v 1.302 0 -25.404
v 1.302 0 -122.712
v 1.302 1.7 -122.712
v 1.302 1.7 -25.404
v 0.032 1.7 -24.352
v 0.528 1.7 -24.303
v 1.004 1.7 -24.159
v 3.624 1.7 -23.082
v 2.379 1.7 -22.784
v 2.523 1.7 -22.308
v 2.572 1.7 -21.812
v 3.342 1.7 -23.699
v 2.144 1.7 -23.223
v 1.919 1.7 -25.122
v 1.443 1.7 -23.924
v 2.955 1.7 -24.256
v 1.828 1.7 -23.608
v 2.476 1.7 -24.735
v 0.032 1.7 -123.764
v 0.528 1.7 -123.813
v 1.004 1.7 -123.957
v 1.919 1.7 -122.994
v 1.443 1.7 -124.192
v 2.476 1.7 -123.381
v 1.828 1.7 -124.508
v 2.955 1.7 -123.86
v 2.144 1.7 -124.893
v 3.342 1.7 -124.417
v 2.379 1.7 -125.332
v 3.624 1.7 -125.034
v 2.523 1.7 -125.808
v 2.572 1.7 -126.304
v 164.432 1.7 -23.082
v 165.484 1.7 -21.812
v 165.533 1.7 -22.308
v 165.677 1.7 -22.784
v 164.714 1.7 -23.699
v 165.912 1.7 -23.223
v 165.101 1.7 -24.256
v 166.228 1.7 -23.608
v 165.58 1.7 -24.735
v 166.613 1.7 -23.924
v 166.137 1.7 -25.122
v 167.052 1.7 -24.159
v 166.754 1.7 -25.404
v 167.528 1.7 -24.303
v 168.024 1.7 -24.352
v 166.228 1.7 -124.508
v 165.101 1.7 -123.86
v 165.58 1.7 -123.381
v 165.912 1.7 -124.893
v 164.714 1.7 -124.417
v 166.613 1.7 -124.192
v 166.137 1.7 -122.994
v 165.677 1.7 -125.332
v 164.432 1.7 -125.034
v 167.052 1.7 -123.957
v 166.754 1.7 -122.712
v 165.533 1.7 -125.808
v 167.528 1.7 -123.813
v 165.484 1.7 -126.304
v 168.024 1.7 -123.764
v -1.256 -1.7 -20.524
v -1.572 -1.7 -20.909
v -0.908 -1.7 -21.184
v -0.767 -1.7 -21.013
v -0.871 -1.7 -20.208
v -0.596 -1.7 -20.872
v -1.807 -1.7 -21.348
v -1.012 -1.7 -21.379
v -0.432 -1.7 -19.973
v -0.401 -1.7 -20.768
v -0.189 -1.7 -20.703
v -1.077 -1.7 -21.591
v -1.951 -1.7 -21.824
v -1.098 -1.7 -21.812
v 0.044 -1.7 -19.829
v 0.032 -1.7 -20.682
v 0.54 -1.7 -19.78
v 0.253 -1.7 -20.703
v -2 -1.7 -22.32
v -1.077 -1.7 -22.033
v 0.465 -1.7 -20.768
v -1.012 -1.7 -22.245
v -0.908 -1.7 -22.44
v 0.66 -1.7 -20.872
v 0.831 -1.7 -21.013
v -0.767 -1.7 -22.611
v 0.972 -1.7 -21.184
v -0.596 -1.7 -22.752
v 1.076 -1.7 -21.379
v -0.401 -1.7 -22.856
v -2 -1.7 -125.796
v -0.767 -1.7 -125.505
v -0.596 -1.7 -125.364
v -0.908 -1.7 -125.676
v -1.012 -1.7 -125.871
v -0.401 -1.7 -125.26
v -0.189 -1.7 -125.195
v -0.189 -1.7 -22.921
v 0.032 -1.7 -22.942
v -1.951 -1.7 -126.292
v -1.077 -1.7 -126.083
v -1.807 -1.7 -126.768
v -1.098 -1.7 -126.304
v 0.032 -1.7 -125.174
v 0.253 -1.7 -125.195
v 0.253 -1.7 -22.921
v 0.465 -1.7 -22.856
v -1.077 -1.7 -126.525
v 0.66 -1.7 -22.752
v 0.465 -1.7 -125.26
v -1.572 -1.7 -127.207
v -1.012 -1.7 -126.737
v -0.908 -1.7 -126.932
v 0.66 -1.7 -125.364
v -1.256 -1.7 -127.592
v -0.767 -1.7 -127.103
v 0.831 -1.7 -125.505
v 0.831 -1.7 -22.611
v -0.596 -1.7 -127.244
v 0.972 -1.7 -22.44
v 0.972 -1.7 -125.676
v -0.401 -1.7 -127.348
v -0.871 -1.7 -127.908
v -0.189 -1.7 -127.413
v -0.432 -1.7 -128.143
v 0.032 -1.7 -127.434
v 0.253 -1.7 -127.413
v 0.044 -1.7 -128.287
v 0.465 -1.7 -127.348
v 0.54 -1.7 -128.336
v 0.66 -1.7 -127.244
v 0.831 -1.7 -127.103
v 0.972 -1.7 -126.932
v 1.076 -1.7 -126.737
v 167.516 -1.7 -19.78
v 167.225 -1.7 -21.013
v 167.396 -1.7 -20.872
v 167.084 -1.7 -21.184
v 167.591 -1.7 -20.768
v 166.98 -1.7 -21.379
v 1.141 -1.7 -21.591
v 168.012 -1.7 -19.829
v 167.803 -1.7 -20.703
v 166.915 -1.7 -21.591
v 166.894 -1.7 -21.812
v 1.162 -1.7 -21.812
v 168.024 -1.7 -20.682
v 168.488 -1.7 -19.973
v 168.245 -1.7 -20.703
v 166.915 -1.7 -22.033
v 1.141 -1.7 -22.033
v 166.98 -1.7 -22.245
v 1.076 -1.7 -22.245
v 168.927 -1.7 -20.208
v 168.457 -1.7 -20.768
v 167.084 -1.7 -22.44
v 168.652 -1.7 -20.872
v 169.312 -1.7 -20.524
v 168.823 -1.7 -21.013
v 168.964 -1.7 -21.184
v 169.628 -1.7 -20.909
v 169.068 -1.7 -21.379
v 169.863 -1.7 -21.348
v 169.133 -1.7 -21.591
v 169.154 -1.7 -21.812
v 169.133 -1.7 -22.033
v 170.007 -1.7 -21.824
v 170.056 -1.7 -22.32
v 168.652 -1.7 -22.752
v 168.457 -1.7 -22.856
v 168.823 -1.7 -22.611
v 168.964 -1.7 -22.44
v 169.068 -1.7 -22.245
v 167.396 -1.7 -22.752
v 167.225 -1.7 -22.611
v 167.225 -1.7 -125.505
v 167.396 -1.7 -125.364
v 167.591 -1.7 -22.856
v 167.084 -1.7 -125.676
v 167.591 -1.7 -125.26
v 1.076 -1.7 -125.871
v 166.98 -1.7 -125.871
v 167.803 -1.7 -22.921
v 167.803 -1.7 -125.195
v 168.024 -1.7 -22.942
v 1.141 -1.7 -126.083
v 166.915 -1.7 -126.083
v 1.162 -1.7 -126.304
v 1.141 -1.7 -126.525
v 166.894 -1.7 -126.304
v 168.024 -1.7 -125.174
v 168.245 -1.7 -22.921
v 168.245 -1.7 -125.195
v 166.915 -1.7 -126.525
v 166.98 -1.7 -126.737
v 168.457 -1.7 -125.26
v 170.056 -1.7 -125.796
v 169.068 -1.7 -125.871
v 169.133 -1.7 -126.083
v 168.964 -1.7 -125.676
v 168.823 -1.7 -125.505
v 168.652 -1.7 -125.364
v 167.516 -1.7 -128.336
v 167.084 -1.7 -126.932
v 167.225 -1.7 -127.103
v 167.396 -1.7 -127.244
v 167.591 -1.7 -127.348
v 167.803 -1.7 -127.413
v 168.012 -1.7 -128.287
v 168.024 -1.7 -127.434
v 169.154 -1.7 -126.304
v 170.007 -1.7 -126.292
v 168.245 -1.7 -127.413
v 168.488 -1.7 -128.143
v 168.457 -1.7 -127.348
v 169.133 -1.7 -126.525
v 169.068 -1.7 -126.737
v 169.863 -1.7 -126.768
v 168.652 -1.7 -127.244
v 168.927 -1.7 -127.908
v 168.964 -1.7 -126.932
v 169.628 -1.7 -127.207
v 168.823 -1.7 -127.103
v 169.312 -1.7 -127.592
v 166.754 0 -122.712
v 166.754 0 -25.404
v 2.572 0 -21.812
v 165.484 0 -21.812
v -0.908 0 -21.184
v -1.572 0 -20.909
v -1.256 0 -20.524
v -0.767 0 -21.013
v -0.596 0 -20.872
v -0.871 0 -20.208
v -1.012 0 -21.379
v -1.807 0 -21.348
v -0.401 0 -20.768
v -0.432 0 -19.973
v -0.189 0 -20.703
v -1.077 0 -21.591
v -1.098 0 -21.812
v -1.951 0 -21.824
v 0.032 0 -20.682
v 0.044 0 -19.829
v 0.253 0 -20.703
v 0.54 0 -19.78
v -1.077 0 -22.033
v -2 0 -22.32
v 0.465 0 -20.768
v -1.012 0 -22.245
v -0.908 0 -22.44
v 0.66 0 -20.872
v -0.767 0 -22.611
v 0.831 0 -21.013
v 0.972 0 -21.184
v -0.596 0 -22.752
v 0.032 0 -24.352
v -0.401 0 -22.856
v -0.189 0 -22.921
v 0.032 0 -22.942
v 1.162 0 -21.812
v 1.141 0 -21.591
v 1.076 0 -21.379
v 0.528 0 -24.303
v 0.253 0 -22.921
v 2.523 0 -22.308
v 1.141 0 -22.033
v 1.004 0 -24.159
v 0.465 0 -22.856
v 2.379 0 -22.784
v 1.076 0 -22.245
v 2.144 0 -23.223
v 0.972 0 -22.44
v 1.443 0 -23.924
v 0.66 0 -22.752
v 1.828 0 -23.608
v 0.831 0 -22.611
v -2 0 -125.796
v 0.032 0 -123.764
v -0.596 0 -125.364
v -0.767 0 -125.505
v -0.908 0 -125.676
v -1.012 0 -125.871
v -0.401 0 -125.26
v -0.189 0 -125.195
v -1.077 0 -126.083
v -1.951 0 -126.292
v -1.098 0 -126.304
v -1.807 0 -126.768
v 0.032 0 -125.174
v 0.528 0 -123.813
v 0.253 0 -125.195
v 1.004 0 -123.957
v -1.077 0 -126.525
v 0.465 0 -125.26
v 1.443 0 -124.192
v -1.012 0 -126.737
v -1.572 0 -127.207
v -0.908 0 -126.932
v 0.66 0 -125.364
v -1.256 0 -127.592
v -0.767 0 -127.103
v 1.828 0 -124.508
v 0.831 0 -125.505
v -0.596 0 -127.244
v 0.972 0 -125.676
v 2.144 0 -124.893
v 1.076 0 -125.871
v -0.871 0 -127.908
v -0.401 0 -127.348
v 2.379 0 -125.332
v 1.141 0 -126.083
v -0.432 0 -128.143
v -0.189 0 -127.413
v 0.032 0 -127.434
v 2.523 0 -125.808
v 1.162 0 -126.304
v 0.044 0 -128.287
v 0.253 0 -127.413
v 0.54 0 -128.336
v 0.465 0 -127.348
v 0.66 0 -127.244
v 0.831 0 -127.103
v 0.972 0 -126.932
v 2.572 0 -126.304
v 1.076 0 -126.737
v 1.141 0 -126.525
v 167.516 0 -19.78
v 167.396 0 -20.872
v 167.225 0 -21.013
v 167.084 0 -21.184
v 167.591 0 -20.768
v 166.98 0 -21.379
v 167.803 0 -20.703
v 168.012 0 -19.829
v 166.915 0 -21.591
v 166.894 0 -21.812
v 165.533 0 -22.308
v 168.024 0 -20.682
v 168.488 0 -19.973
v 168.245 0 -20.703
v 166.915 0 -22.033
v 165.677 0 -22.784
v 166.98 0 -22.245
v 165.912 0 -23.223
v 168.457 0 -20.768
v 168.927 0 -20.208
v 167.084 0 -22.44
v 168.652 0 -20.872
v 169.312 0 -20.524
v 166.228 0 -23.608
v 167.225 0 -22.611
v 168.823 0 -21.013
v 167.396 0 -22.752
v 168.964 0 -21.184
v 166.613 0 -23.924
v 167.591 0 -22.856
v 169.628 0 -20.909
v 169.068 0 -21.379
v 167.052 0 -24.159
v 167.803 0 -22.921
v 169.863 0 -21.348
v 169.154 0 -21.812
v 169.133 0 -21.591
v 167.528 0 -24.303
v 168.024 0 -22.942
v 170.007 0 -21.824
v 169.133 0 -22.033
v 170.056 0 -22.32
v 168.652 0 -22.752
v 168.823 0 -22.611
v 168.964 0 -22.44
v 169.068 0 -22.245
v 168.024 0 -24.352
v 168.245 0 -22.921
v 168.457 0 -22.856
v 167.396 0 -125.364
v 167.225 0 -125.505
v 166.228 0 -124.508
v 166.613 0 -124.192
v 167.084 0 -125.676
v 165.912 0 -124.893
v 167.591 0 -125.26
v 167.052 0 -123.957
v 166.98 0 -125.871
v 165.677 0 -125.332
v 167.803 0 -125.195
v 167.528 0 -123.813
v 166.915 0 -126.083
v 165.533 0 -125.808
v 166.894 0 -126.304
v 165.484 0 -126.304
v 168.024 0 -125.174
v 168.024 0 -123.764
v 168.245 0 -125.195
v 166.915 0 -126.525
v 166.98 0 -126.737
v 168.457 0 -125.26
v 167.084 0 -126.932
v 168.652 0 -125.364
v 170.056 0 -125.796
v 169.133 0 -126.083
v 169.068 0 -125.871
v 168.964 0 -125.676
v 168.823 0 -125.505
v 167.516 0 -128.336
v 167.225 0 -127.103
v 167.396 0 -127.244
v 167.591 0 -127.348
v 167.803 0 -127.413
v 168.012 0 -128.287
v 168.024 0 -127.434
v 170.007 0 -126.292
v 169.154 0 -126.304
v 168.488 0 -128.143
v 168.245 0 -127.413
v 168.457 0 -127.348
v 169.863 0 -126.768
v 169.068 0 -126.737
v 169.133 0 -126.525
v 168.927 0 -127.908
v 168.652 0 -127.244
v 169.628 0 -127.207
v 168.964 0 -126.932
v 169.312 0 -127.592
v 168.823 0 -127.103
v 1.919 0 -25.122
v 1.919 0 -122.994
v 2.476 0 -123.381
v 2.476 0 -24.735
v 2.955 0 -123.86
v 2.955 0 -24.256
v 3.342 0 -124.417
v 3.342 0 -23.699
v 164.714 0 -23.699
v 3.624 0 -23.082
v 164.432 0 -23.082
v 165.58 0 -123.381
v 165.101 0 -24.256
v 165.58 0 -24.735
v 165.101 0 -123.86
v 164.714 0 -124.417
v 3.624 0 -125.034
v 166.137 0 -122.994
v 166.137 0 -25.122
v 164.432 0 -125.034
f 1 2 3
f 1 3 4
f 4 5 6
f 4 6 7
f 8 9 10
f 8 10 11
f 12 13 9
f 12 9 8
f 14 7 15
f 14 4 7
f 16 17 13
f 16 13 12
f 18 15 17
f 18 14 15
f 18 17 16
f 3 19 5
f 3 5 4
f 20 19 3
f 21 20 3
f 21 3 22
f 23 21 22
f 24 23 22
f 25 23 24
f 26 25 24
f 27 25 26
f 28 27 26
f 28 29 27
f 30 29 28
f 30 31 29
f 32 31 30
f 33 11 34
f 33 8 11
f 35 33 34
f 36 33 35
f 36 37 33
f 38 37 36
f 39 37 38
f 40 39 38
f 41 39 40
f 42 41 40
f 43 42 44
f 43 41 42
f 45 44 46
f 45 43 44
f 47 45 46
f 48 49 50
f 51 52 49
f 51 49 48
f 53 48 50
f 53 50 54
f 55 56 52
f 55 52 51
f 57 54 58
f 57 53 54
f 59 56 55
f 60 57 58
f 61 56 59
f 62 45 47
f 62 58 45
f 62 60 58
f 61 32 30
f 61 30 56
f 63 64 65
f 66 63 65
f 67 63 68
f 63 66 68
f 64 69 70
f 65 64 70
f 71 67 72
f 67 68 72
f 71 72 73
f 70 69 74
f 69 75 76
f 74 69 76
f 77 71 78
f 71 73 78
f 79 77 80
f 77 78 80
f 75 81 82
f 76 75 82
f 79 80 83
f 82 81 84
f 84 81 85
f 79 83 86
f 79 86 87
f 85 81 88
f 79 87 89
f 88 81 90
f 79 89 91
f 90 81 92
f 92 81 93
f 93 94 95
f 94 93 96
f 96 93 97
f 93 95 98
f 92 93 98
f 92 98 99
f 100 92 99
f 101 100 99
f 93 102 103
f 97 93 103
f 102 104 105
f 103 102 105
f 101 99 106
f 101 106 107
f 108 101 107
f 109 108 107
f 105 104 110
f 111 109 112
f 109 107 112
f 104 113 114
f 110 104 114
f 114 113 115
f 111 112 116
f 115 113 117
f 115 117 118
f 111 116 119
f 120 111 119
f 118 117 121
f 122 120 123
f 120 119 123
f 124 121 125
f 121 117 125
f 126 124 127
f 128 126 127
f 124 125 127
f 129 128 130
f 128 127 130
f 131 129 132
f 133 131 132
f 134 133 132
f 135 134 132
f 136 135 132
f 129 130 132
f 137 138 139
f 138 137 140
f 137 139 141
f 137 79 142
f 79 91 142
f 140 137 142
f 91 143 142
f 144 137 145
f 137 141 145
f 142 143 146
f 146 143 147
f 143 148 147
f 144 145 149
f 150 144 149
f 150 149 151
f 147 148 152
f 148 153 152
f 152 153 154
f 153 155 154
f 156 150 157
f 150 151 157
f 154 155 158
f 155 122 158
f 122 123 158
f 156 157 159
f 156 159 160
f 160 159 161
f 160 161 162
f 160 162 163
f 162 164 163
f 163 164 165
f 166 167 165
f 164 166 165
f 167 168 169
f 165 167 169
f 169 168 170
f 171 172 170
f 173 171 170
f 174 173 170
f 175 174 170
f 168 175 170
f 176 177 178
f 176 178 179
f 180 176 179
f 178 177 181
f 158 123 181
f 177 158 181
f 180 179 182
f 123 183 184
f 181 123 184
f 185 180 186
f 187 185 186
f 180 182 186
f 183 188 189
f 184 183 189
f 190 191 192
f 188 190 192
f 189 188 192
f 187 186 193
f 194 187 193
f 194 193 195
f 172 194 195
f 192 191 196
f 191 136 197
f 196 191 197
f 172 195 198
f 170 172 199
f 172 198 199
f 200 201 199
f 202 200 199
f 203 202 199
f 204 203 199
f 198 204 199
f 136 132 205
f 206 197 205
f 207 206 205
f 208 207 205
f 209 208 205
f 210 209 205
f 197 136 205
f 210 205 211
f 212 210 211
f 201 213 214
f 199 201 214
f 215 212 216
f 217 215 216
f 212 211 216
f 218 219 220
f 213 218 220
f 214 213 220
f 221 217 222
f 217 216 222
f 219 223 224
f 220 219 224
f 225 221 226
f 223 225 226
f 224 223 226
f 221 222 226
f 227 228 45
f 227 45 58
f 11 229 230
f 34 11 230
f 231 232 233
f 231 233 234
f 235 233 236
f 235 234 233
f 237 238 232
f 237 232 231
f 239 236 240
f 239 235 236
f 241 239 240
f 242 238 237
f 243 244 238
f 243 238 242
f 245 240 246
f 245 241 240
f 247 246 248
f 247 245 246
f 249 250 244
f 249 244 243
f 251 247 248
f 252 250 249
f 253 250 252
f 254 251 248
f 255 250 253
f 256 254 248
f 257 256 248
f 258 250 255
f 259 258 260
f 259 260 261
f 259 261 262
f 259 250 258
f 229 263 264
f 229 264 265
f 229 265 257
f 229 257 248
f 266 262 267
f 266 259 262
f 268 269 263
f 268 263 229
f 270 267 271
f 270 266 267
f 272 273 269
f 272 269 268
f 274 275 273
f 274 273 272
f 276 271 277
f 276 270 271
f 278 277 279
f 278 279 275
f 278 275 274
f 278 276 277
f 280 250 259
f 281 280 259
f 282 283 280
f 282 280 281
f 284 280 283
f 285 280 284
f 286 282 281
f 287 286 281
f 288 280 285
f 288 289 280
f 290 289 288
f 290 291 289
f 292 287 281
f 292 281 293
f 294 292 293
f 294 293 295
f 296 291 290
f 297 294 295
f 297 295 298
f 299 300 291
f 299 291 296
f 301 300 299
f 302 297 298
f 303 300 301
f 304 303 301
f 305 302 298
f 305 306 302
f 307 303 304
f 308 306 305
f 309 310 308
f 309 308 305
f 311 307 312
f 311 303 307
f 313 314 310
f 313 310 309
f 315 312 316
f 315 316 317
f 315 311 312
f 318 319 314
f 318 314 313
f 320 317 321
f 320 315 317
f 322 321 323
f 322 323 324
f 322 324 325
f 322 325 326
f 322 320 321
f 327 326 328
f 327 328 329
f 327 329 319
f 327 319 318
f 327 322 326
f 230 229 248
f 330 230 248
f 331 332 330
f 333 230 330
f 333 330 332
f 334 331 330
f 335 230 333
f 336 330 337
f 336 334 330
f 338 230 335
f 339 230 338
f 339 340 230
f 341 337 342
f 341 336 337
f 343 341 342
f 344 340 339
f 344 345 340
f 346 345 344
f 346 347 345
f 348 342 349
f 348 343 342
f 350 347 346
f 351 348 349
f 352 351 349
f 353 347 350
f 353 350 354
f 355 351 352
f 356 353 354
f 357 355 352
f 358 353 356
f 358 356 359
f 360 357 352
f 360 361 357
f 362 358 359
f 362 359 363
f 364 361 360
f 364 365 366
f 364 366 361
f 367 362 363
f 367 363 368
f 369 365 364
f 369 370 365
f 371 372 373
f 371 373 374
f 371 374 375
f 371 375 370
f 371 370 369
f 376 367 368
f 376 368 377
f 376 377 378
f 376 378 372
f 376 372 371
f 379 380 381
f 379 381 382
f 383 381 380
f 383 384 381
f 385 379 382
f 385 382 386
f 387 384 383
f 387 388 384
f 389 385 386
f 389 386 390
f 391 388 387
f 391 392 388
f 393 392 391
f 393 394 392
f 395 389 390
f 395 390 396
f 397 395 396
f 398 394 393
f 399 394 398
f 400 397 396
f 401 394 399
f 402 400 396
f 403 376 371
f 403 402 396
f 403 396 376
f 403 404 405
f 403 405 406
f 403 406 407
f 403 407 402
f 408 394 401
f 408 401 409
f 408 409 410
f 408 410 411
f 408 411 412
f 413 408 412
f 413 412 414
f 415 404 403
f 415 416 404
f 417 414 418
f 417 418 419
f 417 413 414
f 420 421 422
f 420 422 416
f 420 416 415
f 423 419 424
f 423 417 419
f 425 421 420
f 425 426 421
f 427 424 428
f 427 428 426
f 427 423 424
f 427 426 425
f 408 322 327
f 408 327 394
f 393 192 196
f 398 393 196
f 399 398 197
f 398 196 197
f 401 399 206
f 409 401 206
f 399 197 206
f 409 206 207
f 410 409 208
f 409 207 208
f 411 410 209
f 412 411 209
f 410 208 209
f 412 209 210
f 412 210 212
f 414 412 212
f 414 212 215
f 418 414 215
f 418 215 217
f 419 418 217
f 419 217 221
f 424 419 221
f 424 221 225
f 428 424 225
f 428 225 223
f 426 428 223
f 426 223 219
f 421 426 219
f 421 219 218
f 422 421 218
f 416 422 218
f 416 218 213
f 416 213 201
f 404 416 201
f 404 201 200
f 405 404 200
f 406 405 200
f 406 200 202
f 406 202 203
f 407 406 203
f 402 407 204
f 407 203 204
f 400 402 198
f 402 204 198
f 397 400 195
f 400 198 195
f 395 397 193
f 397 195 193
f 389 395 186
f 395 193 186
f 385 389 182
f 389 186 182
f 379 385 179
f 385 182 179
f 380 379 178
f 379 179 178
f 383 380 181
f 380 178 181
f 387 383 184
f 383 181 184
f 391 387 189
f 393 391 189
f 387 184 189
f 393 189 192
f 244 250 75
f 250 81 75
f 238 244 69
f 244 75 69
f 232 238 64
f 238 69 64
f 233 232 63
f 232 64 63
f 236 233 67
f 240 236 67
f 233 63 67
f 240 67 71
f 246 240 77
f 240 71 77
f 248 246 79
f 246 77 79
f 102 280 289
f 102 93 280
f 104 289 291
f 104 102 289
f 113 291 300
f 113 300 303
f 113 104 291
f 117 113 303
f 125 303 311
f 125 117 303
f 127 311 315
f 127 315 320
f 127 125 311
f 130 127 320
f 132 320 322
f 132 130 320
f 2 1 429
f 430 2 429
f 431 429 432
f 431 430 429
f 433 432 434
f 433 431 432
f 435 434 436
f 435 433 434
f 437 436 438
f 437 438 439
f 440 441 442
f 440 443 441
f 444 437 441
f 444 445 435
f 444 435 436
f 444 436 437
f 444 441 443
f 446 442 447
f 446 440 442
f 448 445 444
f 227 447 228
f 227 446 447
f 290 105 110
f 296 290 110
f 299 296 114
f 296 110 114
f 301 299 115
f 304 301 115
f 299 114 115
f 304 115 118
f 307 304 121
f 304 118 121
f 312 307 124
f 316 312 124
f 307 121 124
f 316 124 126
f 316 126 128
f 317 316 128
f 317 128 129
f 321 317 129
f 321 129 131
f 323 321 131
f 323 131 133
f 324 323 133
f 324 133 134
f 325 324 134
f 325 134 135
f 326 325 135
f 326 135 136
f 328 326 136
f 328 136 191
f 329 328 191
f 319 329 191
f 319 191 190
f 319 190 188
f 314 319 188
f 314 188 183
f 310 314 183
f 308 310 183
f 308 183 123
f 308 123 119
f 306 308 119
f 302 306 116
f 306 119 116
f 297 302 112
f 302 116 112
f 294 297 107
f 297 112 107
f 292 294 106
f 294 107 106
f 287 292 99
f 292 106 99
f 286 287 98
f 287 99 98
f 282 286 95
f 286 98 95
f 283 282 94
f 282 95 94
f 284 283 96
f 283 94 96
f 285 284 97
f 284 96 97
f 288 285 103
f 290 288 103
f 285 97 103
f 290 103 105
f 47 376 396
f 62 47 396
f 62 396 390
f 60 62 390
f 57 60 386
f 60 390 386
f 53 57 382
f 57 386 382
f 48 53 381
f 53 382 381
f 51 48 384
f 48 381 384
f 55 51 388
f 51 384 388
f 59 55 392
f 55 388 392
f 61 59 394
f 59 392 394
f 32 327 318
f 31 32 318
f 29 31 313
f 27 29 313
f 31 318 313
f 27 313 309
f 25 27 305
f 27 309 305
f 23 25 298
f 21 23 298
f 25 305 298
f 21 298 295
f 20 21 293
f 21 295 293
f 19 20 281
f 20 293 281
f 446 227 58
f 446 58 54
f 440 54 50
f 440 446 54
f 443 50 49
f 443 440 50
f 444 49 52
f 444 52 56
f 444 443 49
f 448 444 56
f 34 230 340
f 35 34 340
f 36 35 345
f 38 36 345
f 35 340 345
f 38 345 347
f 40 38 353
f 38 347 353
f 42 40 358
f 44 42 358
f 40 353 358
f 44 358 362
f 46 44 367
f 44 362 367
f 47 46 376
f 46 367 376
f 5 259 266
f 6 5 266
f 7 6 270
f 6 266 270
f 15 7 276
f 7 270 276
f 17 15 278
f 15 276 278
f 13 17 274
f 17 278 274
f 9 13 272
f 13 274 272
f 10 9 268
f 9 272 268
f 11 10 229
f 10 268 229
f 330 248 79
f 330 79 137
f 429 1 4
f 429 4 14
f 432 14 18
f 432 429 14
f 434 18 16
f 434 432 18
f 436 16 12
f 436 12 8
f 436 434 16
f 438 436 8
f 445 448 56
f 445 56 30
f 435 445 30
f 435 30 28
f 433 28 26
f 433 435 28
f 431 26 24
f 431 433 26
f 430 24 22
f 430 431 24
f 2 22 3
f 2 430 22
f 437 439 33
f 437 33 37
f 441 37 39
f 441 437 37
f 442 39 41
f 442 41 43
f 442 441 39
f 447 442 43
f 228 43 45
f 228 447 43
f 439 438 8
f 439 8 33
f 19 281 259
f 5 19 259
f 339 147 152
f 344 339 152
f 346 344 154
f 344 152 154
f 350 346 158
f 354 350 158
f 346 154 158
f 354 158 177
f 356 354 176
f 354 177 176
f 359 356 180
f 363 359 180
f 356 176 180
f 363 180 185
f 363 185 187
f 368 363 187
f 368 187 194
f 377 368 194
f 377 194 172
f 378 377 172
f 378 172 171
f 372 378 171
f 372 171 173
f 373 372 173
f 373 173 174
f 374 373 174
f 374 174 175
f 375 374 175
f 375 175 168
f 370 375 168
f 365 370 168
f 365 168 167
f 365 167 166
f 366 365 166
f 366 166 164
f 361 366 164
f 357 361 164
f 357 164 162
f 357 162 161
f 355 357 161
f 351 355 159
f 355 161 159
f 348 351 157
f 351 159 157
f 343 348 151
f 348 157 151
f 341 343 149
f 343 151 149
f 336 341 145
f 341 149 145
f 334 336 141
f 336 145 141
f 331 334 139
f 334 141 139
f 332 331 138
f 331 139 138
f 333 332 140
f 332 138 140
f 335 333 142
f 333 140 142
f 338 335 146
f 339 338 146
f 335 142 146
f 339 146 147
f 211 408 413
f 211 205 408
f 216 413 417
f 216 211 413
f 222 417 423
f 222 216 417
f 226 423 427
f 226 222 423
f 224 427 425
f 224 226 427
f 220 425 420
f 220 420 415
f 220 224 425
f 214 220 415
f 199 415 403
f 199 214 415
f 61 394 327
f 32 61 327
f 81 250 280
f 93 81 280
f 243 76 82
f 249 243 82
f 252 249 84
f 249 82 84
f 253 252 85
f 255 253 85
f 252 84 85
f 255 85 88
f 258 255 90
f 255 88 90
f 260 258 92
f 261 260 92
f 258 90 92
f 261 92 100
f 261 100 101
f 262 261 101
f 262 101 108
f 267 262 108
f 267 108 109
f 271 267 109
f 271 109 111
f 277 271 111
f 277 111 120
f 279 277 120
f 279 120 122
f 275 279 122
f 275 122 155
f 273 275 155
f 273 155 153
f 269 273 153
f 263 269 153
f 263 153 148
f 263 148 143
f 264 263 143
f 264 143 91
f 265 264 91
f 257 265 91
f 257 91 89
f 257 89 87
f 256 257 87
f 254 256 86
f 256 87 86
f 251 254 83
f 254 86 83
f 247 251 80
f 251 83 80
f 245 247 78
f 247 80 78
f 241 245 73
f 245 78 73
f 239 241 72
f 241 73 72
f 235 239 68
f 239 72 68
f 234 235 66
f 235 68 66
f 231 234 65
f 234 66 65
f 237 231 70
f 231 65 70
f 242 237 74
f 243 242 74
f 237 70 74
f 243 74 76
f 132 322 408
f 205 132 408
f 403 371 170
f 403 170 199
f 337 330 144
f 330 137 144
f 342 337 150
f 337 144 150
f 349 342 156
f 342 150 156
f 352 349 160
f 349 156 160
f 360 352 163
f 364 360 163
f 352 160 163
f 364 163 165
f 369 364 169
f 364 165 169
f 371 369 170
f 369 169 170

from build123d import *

# Parameters (mm, degrees)
SKETCH20_W            = 172.0559932
SKETCH20_H            = 108.5559932
BOSS_EXTRUDE5_DEPTH   = 1.699999902
BOSS_EXTRUDE6_DEPTH   = 1.7
FILLET3_R             = 2.54
F_4_40_TAPPED_HOLE3_D = 2.2606


with BuildPart() as part:
    # Sketch20 → Boss-Extrude5 (new body)
    with BuildSketch(Plane(origin=(0, 0, 0), x_dir=(1, 0, 0), z_dir=(0, 1, 0))):
        with Locations((84.0279966, 74.0579966)):
            Rectangle(SKETCH20_W, SKETCH20_H)
    extrude(amount=-BOSS_EXTRUDE5_DEPTH)

    # Sketch20<3> → Boss-Extrude6 (add)
    with BuildSketch(Plane(origin=(0, 0, 0), x_dir=(1, 0, 0), z_dir=(0, 1, 0))):
        with BuildLine():
            Line((2.572, 21.812), (165.4839932, 21.812))
            ThreePointArc((165.4839932, 21.812), (166.227941976, 23.608051224), (168.0239932, 24.352))
            Line((168.0239932, 24.352), (168.0239932, 123.7639932))
            ThreePointArc((168.0239932, 123.7639932), (166.227941976, 124.507941976), (165.4839932, 126.3039932))
            Line((165.4839932, 126.3039932), (2.572, 126.3039932))
            ThreePointArc((2.572, 126.3039932), (1.828051224, 124.507941976), (0.032, 123.7639932))
            Line((0.032, 123.7639932), (0.032, 24.352))
            ThreePointArc((0.032, 24.352), (1.828051224, 23.608051224), (2.572, 21.812))
        make_face()
        with BuildLine():
            Line((3.624102448, 23.082), (164.431890752, 23.082))
            ThreePointArc((164.431890752, 23.082), (165.329916364, 24.506076836), (166.7539932, 25.404102448))
            Line((166.7539932, 25.404102448), (166.7539932, 122.711890752))
            ThreePointArc((166.7539932, 122.711890752), (165.329916364, 123.609916364), (164.431890752, 125.0339932))
            Line((164.431890752, 125.0339932), (3.624102448, 125.0339932))
            ThreePointArc((3.624102448, 125.0339932), (2.726076836, 123.609916364), (1.302, 122.711890752))
            Line((1.302, 122.711890752), (1.302, 25.404102448))
            ThreePointArc((1.302, 25.404102448), (2.726076836, 24.506076836), (3.624102448, 23.082))
        make_face(mode=Mode.SUBTRACT)
    extrude(amount=BOSS_EXTRUDE6_DEPTH)

    # Fillet3
    fillet3_edges = [part.edges().sort_by_distance(p)[0] for p in [
        (-2, -0.849999951, -128.3359932),
        (-2, -0.849999951, -19.78),
        (170.0559932, -0.849999951, -19.78),
        (170.0559932, -0.849999951, -128.3359932),
    ]]
    fillet(fillet3_edges, radius=FILLET3_R)

    # #4-40 Tapped Hole3 (through all)
    with Locations(Plane(origin=(0, 0, 0), x_dir=(1, 0, 0), z_dir=(0, 1, 0))):
        with Locations((0.032, 21.812), (168.0239932, 21.812), (168.0239932, 126.3039932), (0.032, 126.3039932)):
            Hole(F_4_40_TAPPED_HOLE3_D / 2)


solid = part.part
